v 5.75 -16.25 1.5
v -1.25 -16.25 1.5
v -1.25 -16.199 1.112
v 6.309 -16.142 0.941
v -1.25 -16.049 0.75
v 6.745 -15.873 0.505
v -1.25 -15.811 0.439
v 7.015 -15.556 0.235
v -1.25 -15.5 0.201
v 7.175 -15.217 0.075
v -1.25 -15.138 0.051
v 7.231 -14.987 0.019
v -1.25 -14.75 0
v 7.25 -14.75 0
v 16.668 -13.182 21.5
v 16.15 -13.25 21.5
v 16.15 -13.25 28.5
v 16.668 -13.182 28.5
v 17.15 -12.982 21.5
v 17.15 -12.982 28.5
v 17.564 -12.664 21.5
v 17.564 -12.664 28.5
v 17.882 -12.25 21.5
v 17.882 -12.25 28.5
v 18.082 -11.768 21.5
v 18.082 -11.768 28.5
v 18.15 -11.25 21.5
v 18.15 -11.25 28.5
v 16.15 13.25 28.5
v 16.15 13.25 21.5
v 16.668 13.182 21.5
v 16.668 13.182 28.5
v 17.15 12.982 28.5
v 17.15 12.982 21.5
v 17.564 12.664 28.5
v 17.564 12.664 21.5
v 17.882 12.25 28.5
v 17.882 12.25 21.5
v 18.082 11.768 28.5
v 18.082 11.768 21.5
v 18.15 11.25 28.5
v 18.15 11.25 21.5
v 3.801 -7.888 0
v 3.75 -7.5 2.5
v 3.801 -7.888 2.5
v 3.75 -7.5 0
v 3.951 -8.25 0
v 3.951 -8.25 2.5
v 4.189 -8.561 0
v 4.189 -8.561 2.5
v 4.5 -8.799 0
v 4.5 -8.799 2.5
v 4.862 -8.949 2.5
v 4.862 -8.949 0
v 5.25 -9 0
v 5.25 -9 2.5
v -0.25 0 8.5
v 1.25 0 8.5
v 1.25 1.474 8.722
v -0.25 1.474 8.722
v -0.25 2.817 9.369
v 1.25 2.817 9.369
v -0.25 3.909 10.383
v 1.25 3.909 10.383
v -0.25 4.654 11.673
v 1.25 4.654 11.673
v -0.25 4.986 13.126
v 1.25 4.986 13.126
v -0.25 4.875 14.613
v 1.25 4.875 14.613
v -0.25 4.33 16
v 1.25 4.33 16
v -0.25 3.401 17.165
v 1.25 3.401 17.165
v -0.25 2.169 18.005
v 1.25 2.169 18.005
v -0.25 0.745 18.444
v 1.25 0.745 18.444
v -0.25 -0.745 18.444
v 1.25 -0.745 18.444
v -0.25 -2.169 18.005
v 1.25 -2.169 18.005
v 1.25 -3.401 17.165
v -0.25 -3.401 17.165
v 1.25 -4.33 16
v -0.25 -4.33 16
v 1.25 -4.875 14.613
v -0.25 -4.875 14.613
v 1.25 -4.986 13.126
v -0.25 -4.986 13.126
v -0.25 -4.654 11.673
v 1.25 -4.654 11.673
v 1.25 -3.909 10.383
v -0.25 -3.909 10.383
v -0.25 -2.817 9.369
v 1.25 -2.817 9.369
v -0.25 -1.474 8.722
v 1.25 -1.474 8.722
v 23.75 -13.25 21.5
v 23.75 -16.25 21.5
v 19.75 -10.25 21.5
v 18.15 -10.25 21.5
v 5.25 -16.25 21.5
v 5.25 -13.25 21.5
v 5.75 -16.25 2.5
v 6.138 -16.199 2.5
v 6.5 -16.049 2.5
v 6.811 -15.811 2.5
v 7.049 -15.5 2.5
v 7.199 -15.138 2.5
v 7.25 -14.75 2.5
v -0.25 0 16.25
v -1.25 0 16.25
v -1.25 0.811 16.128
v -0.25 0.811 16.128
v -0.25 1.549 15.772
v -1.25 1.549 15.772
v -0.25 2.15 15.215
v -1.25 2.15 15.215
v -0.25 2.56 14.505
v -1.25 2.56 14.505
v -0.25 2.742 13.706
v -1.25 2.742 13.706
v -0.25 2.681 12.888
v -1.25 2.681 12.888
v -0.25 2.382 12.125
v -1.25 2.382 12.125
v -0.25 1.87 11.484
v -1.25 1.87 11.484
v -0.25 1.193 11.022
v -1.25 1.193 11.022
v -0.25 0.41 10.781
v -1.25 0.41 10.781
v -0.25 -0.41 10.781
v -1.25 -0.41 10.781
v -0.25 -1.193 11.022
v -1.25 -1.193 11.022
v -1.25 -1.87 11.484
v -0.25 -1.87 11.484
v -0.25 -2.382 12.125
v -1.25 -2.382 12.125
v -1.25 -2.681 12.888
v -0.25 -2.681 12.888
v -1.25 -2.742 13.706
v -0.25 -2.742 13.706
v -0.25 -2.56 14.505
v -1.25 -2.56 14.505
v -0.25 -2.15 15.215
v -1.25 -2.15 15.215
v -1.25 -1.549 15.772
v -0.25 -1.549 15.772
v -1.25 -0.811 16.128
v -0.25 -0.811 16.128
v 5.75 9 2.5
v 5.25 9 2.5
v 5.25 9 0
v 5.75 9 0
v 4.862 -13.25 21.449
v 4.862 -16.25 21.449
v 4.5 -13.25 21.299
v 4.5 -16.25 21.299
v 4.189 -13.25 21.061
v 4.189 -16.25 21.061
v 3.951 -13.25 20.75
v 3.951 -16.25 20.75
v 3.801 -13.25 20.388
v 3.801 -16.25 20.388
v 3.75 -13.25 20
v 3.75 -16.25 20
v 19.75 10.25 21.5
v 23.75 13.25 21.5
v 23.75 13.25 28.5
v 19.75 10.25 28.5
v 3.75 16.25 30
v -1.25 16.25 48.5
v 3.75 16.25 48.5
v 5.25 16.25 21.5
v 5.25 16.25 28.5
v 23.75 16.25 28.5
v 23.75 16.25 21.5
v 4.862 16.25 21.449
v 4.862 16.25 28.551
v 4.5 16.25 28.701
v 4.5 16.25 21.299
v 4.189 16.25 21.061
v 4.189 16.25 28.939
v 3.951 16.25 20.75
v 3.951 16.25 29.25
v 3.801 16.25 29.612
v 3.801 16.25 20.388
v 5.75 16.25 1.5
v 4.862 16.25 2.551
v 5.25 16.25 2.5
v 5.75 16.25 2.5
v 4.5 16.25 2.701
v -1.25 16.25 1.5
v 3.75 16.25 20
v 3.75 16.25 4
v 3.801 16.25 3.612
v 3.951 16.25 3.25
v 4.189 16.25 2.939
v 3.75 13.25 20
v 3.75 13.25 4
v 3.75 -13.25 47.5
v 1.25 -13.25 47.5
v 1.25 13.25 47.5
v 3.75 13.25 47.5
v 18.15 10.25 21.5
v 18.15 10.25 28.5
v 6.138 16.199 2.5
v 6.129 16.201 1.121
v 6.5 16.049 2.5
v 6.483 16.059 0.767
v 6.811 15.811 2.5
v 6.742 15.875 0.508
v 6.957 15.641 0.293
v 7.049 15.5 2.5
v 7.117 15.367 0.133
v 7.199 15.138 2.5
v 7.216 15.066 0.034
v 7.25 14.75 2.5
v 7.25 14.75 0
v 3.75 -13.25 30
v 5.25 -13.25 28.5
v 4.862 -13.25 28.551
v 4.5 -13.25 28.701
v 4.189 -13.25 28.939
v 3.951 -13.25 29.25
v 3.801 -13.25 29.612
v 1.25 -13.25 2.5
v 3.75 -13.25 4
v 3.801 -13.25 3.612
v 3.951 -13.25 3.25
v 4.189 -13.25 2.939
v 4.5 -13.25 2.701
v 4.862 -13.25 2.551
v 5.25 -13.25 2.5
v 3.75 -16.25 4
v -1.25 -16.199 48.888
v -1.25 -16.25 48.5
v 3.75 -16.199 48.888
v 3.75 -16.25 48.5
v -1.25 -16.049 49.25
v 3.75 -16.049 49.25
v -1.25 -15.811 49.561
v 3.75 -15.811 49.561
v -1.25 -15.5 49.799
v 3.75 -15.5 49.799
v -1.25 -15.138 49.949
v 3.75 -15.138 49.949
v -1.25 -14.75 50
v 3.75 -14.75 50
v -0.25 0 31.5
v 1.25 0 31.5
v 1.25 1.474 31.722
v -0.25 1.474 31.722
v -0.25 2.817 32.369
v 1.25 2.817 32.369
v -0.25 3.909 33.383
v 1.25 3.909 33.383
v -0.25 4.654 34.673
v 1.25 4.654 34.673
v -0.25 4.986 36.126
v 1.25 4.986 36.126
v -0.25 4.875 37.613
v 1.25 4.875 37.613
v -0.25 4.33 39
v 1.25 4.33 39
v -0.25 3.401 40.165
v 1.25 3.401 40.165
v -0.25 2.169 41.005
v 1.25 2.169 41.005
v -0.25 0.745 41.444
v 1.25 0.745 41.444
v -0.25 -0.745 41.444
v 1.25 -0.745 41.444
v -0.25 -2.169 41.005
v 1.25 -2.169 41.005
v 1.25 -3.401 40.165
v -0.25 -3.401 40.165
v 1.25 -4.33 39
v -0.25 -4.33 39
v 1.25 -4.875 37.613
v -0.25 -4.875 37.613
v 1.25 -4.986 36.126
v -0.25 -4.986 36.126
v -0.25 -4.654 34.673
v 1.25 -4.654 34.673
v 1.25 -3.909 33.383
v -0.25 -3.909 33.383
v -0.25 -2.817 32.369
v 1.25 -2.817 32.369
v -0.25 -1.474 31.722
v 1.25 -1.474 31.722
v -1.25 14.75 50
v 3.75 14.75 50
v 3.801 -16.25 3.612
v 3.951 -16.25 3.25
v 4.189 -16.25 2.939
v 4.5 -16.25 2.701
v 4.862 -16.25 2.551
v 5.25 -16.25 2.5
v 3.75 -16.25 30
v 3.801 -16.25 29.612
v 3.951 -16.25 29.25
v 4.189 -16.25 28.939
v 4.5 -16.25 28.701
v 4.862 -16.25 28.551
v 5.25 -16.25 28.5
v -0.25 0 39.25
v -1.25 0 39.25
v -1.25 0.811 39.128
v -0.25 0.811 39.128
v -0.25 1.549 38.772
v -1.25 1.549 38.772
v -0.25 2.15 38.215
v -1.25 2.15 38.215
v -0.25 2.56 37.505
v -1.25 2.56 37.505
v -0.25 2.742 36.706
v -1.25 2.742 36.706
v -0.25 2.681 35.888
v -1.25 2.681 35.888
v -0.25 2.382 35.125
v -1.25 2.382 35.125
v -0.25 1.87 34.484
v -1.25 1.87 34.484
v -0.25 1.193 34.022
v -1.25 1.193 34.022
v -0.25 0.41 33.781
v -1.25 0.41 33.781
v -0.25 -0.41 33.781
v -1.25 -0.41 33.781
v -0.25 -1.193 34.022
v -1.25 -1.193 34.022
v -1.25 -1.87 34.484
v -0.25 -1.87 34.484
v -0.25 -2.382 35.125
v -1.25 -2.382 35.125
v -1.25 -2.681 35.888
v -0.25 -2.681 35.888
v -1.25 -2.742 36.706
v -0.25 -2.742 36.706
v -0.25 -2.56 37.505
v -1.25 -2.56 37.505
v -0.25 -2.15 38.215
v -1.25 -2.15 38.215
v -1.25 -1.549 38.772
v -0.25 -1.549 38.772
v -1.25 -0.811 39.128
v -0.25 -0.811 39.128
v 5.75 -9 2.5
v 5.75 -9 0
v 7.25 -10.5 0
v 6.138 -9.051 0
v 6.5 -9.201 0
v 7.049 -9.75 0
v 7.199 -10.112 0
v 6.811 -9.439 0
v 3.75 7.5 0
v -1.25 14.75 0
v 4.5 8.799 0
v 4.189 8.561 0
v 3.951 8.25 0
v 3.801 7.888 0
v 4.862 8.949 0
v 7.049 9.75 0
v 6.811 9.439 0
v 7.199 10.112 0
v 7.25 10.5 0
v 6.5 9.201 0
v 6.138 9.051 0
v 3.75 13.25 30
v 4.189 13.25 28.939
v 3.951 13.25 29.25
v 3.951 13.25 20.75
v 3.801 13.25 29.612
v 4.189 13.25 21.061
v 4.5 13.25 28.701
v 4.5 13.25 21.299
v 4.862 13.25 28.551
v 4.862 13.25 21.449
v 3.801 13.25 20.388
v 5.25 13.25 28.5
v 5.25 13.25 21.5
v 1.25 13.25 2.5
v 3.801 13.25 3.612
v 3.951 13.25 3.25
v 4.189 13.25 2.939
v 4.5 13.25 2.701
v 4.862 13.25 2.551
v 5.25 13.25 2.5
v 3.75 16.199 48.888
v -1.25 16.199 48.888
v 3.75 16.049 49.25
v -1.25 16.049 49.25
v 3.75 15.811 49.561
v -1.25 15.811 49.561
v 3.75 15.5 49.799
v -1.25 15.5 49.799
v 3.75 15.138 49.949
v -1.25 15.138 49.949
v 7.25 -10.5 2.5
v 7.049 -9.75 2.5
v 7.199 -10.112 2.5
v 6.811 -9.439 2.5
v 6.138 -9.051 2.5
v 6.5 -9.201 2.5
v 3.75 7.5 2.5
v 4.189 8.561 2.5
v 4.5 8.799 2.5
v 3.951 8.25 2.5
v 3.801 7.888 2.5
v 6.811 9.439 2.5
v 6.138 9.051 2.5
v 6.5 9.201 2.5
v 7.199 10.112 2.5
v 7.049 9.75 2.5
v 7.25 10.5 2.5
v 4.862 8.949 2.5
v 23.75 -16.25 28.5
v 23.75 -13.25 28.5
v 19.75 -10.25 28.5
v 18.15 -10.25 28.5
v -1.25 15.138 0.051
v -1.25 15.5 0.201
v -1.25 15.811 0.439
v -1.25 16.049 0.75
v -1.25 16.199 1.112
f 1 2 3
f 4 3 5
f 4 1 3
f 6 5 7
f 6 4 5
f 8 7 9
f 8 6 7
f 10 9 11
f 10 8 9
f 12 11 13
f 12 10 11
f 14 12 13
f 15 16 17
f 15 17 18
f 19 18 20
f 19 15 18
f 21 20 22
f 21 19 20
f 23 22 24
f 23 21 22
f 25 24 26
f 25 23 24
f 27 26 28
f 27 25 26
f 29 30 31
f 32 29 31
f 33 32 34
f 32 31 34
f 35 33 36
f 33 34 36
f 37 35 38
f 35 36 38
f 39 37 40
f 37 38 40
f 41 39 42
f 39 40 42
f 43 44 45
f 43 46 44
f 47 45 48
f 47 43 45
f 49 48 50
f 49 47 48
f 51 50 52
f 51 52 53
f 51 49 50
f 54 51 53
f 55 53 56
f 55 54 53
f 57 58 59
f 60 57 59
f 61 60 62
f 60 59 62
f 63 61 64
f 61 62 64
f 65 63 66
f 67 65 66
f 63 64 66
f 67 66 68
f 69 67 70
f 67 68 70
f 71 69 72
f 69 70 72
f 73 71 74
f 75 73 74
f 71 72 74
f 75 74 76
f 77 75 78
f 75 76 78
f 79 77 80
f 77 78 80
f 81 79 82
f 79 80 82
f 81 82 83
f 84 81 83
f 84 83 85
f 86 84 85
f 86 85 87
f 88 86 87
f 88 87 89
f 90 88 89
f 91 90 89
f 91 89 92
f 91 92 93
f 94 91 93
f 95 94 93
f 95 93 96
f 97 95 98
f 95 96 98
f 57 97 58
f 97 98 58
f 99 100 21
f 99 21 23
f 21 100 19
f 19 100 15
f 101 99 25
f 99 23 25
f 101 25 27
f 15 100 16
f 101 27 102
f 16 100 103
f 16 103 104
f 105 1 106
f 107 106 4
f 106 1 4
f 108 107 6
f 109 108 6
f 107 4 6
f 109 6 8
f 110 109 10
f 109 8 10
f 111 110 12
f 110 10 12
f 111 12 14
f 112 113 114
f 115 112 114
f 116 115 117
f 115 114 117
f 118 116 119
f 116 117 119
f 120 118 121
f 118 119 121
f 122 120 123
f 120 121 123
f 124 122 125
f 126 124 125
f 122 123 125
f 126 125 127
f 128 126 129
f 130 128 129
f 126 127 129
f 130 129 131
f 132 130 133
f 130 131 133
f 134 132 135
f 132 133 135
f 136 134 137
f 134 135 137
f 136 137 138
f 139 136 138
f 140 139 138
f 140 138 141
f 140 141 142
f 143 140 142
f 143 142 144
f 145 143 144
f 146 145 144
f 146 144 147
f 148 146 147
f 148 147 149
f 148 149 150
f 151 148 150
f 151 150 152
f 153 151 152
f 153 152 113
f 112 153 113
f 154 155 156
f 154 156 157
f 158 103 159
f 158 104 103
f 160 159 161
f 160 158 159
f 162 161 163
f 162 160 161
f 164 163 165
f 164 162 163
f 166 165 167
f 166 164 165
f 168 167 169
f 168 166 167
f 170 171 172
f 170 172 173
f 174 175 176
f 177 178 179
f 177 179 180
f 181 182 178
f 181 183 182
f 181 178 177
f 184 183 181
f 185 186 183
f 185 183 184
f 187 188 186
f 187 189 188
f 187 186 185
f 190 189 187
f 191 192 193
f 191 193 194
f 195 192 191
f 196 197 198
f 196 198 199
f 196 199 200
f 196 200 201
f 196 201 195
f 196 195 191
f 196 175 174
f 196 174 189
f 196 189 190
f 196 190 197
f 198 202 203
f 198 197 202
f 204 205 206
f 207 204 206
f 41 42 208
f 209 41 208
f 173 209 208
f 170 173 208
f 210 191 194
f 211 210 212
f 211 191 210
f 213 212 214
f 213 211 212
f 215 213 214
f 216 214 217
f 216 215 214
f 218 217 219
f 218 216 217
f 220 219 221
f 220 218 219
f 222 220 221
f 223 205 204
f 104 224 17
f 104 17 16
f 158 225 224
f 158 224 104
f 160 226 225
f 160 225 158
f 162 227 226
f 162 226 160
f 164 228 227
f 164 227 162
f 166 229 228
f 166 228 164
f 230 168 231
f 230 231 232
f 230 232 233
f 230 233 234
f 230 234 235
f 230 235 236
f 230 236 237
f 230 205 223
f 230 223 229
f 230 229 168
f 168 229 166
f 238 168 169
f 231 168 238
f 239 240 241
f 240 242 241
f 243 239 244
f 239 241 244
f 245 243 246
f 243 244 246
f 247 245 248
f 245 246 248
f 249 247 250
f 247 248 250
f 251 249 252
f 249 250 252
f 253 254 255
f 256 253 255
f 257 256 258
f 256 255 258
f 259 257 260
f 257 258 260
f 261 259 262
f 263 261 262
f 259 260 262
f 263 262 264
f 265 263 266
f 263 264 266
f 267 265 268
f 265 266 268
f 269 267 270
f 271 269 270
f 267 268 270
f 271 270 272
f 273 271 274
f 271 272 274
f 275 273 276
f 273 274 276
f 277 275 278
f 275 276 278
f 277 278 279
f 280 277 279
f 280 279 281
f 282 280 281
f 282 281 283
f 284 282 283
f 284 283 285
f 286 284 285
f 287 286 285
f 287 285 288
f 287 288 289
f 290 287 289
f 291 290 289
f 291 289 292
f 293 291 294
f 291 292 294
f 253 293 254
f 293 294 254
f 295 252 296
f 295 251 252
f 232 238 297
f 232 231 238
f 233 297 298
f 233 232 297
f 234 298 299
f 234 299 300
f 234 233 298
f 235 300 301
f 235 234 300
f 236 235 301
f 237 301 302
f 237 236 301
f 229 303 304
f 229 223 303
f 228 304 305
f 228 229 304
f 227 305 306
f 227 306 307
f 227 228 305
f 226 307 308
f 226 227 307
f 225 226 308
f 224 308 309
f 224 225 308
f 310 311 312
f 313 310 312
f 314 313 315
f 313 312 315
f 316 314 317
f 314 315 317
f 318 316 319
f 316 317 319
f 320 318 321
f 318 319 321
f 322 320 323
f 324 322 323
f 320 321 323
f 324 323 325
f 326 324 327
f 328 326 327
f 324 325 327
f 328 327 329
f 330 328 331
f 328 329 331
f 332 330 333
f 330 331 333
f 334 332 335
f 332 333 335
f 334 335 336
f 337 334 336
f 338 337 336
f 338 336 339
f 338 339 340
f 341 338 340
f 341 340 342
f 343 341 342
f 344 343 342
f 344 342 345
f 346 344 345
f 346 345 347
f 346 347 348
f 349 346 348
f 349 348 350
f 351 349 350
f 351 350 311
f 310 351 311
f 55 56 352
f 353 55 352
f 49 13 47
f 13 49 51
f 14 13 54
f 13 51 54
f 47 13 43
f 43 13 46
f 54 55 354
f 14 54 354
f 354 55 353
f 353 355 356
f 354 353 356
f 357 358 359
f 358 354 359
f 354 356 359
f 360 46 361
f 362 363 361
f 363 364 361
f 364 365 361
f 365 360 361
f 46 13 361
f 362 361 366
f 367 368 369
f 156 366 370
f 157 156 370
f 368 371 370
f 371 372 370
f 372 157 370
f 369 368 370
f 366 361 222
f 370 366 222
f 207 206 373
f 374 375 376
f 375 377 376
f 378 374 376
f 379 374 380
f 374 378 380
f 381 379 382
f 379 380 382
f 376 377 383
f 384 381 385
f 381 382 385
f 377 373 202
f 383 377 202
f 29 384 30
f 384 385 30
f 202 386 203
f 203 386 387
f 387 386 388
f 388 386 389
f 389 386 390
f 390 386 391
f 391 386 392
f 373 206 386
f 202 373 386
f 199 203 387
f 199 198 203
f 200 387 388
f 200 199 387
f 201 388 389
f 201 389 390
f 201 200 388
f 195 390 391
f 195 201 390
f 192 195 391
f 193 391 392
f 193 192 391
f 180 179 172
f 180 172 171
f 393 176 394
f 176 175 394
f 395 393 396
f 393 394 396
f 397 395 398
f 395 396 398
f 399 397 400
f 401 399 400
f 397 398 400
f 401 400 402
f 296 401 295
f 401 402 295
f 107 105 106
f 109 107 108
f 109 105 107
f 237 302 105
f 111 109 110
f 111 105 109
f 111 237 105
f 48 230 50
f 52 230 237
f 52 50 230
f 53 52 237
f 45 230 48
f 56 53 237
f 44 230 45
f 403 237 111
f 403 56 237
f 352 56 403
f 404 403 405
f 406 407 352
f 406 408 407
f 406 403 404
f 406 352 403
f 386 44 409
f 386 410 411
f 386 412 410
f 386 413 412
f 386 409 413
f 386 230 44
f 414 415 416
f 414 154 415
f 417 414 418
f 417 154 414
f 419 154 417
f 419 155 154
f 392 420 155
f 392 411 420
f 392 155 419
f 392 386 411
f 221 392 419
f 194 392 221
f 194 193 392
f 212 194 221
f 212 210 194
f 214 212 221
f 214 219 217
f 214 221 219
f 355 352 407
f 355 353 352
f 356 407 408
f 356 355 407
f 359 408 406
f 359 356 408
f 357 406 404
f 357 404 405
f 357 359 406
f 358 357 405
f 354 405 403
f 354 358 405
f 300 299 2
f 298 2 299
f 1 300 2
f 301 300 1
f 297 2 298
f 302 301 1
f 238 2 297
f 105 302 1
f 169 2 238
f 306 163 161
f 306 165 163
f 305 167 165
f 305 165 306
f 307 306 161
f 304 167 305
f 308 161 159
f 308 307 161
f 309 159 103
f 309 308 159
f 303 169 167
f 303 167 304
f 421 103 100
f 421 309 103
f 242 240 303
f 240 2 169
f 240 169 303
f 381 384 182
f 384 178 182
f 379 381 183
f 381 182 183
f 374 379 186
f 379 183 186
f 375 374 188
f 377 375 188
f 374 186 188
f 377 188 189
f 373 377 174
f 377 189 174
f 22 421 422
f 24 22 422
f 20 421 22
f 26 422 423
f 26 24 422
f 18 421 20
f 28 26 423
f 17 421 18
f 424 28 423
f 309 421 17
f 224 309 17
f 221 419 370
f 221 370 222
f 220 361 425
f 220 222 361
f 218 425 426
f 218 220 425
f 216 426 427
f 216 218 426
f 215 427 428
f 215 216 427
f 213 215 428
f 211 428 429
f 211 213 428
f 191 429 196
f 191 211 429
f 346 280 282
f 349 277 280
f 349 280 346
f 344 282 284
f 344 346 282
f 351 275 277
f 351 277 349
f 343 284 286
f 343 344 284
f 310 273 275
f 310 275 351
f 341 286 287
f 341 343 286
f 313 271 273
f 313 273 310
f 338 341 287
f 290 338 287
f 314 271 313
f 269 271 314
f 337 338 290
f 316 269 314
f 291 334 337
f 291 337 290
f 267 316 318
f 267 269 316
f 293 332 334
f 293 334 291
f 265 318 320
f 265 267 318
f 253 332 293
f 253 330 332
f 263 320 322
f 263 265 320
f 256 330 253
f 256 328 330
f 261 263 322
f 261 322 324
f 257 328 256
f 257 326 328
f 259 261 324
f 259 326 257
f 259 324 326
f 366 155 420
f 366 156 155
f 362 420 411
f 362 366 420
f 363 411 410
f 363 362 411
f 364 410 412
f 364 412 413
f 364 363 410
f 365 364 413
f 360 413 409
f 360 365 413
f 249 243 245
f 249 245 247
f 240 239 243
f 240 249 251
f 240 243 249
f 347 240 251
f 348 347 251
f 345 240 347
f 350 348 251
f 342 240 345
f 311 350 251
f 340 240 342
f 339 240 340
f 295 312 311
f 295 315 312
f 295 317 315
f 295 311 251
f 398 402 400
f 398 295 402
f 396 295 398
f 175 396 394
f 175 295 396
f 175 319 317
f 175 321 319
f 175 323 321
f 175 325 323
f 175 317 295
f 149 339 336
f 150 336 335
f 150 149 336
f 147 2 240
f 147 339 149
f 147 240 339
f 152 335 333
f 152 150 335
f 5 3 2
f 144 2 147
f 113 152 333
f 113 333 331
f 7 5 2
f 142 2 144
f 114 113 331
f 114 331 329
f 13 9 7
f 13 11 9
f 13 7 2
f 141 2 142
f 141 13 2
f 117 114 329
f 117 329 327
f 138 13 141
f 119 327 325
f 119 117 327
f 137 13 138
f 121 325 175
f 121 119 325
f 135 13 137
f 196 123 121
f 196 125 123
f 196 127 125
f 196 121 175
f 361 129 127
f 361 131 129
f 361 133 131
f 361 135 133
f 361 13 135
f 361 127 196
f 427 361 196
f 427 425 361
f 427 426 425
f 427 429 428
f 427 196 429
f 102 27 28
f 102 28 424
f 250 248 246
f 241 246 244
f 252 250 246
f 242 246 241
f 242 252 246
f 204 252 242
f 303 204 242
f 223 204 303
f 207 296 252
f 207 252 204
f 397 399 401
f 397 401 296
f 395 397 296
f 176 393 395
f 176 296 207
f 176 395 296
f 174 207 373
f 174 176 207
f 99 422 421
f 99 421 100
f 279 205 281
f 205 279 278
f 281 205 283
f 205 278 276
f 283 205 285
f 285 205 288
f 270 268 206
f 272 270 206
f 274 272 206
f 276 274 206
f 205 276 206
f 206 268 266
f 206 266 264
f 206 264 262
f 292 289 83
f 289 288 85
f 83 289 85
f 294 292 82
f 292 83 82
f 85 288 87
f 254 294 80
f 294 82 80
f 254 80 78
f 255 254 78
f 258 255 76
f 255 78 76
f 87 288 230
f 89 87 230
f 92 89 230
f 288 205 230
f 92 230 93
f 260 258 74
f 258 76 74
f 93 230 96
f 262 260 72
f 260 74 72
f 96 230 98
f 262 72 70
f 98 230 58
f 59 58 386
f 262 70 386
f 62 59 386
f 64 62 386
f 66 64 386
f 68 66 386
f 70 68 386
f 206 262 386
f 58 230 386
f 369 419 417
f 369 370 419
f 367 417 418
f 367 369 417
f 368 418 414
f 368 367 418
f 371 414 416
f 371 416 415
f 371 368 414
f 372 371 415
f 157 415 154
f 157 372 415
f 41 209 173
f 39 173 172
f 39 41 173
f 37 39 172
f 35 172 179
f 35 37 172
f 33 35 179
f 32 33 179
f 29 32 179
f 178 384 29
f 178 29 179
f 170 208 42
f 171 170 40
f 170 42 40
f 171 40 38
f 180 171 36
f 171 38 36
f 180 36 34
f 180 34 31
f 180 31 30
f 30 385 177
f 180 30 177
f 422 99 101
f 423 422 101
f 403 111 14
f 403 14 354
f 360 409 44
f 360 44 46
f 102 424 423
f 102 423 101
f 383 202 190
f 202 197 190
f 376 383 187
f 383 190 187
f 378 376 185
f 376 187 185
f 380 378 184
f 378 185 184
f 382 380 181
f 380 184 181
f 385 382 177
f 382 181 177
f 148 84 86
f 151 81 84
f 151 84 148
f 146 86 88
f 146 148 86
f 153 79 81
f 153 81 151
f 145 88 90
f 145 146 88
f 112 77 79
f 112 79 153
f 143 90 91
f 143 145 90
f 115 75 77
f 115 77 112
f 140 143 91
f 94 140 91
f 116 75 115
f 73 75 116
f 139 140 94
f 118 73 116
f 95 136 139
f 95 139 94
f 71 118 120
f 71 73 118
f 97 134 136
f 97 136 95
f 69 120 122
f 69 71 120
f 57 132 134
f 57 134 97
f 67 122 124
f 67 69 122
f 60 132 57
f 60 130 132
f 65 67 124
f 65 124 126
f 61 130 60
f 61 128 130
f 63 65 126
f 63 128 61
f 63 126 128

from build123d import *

# Parameters (mm, degrees)
SKETCH1_W           = 2.5
SKETCH1_H           = 32.5
BOSS_EXTRUDE1_DEPTH = 50
SKETCH5_R           = 2.75
CUT_EXTRUDE5_DEPTH  = 30.5
SKETCH6_R           = 5
CUT_EXTRUDE6_DEPTH  = 1.5
SKETCH7_W           = 50
SKETCH7_H           = 32.5
SKETCH7_W_2         = 45
SKETCH7_H_2         = 26.5
BOSS_EXTRUDE2_DEPTH = 2.5
SKETCH8_W           = 7
SKETCH8_H           = 6
BOSS_EXTRUDE3_DEPTH = 20
CUT_EXTRUDE9_DEPTH  = 20
SKETCH10_W          = 3.5
SKETCH10_H          = 7.25
BOSS_EXTRUDE4_DEPTH = 2.5
FILLET1_R           = 1.5


with BuildPart() as part:
    # Sketch1 → Boss-Extrude1 (new body)
    with BuildSketch(Plane.XY):
        Rectangle(SKETCH1_W, SKETCH1_H)
    extrude(amount=BOSS_EXTRUDE1_DEPTH)

    # Sketch5 → Cut-Extrude5 (cut)
    with BuildSketch(Plane.ZY.offset(1.25)):
        with Locations((13.5, 0)):
            Circle(SKETCH5_R)
        with Locations((36.5, 0)):
            Circle(SKETCH5_R)
    extrude(amount=-CUT_EXTRUDE5_DEPTH, mode=Mode.SUBTRACT)

    # Sketch6 → Cut-Extrude6 (cut)
    with BuildSketch(Plane(origin=(1.25, 0, 0), x_dir=(0, 0, -1), z_dir=(1, 0, 0))):
        with Locations((-36.5, 0)):
            Circle(SKETCH6_R)
        with Locations((-13.5, 0)):
            Circle(SKETCH6_R)
    extrude(amount=-CUT_EXTRUDE6_DEPTH, mode=Mode.SUBTRACT)

    # Sketch7 → Boss-Extrude2 (add)
    with BuildSketch(Plane(origin=(1.25, 0, 0), x_dir=(0, 0, -1), z_dir=(1, 0, 0))):
        with Locations((-25, 0)):
            Rectangle(SKETCH7_W, SKETCH7_H)
        with Locations((-25, 0)):
            Rectangle(SKETCH7_W_2, SKETCH7_H_2, mode=Mode.SUBTRACT)
    extrude(amount=BOSS_EXTRUDE2_DEPTH)

    # Sketch8 → Boss-Extrude3 (add)
    with BuildSketch(Plane(origin=(3.75, 0, 0), x_dir=(0, 0, -1), z_dir=(1, 0, 0))):
        with Locations((-25, 13.25)):
            Rectangle(SKETCH8_W, SKETCH8_H)
        with Locations((-25, -13.25)):
            Rectangle(SKETCH8_W, SKETCH8_H)
    extrude(amount=BOSS_EXTRUDE3_DEPTH)

    # Sketch9 → Cut-Extrude9 (cut)
    with BuildSketch(Plane(origin=(0, 0, 21.5), x_dir=(-1, 0, 0), z_dir=(0, 0, -1))):
        with BuildLine():
            Line((-3.75, 13.25), (-16.15, 13.25))
            ThreePointArc((-16.15, 13.25), (-17.564213562, 12.664213562), (-18.15, 11.25))
            Line((-18.15, 11.25), (-18.15, 10.25))
            Line((-18.15, 10.25), (-3.75, 10.25))
            Line((-3.75, 10.25), (-3.75, 13.25))
        make_face()
        with BuildLine():
            Line((-3.75, -10.25), (-3.75, -13.25))
            Line((-3.75, -13.25), (-16.15, -13.25))
            ThreePointArc((-16.15, -13.25), (-17.564213562, -12.664213562), (-18.15, -11.25))
            Line((-18.15, -11.25), (-18.15, -10.25))
            Line((-18.15, -10.25), (-3.75, -10.25))
        make_face()
        Polygon((-23.75, 13.25), (-19.75, 10.25), (-23.75, 10.25), align=None)
        Polygon((-23.75, -10.25), (-23.75, -13.25), (-19.75, -10.25), align=None)
    extrude(amount=-CUT_EXTRUDE9_DEPTH, mode=Mode.SUBTRACT)

    # Sketch10 → Boss-Extrude4 (add)
    with BuildSketch(Plane.XY.offset(2.5)):
        with Locations((5.5, -12.625)):
            Rectangle(SKETCH10_W, SKETCH10_H)
        with Locations((5.5, 12.625)):
            Rectangle(SKETCH10_W, SKETCH10_H)
    extrude(amount=-BOSS_EXTRUDE4_DEPTH)

    # Fillet1
    fillet1_edges = [part.edges().sort_by_distance(p)[0] for p in [
        (3, -16.25, 0),
        (3, 16.25, 0),
        (1.25, 16.25, 50),
        (1.25, -16.25, 50),
        (3.75, -14.75, 28.5),
        (3.75, 14.75, 28.5),
        (3.75, 14.75, 21.5),
        (3.75, -14.75, 21.5),
        (7.25, -16.25, 1.25),
        (3.75, -14.75, 2.5),
        (3.75, 14.75, 2.5),
        (7.25, 16.25, 1.25),
        (7.25, -9, 1.25),
        (3.75, -9, 1.25),
        (7.25, 9, 1.25),
        (3.75, 9, 1.25),
    ]]
    fillet(fillet1_edges, radius=FILLET1_R)


solid = part.part
